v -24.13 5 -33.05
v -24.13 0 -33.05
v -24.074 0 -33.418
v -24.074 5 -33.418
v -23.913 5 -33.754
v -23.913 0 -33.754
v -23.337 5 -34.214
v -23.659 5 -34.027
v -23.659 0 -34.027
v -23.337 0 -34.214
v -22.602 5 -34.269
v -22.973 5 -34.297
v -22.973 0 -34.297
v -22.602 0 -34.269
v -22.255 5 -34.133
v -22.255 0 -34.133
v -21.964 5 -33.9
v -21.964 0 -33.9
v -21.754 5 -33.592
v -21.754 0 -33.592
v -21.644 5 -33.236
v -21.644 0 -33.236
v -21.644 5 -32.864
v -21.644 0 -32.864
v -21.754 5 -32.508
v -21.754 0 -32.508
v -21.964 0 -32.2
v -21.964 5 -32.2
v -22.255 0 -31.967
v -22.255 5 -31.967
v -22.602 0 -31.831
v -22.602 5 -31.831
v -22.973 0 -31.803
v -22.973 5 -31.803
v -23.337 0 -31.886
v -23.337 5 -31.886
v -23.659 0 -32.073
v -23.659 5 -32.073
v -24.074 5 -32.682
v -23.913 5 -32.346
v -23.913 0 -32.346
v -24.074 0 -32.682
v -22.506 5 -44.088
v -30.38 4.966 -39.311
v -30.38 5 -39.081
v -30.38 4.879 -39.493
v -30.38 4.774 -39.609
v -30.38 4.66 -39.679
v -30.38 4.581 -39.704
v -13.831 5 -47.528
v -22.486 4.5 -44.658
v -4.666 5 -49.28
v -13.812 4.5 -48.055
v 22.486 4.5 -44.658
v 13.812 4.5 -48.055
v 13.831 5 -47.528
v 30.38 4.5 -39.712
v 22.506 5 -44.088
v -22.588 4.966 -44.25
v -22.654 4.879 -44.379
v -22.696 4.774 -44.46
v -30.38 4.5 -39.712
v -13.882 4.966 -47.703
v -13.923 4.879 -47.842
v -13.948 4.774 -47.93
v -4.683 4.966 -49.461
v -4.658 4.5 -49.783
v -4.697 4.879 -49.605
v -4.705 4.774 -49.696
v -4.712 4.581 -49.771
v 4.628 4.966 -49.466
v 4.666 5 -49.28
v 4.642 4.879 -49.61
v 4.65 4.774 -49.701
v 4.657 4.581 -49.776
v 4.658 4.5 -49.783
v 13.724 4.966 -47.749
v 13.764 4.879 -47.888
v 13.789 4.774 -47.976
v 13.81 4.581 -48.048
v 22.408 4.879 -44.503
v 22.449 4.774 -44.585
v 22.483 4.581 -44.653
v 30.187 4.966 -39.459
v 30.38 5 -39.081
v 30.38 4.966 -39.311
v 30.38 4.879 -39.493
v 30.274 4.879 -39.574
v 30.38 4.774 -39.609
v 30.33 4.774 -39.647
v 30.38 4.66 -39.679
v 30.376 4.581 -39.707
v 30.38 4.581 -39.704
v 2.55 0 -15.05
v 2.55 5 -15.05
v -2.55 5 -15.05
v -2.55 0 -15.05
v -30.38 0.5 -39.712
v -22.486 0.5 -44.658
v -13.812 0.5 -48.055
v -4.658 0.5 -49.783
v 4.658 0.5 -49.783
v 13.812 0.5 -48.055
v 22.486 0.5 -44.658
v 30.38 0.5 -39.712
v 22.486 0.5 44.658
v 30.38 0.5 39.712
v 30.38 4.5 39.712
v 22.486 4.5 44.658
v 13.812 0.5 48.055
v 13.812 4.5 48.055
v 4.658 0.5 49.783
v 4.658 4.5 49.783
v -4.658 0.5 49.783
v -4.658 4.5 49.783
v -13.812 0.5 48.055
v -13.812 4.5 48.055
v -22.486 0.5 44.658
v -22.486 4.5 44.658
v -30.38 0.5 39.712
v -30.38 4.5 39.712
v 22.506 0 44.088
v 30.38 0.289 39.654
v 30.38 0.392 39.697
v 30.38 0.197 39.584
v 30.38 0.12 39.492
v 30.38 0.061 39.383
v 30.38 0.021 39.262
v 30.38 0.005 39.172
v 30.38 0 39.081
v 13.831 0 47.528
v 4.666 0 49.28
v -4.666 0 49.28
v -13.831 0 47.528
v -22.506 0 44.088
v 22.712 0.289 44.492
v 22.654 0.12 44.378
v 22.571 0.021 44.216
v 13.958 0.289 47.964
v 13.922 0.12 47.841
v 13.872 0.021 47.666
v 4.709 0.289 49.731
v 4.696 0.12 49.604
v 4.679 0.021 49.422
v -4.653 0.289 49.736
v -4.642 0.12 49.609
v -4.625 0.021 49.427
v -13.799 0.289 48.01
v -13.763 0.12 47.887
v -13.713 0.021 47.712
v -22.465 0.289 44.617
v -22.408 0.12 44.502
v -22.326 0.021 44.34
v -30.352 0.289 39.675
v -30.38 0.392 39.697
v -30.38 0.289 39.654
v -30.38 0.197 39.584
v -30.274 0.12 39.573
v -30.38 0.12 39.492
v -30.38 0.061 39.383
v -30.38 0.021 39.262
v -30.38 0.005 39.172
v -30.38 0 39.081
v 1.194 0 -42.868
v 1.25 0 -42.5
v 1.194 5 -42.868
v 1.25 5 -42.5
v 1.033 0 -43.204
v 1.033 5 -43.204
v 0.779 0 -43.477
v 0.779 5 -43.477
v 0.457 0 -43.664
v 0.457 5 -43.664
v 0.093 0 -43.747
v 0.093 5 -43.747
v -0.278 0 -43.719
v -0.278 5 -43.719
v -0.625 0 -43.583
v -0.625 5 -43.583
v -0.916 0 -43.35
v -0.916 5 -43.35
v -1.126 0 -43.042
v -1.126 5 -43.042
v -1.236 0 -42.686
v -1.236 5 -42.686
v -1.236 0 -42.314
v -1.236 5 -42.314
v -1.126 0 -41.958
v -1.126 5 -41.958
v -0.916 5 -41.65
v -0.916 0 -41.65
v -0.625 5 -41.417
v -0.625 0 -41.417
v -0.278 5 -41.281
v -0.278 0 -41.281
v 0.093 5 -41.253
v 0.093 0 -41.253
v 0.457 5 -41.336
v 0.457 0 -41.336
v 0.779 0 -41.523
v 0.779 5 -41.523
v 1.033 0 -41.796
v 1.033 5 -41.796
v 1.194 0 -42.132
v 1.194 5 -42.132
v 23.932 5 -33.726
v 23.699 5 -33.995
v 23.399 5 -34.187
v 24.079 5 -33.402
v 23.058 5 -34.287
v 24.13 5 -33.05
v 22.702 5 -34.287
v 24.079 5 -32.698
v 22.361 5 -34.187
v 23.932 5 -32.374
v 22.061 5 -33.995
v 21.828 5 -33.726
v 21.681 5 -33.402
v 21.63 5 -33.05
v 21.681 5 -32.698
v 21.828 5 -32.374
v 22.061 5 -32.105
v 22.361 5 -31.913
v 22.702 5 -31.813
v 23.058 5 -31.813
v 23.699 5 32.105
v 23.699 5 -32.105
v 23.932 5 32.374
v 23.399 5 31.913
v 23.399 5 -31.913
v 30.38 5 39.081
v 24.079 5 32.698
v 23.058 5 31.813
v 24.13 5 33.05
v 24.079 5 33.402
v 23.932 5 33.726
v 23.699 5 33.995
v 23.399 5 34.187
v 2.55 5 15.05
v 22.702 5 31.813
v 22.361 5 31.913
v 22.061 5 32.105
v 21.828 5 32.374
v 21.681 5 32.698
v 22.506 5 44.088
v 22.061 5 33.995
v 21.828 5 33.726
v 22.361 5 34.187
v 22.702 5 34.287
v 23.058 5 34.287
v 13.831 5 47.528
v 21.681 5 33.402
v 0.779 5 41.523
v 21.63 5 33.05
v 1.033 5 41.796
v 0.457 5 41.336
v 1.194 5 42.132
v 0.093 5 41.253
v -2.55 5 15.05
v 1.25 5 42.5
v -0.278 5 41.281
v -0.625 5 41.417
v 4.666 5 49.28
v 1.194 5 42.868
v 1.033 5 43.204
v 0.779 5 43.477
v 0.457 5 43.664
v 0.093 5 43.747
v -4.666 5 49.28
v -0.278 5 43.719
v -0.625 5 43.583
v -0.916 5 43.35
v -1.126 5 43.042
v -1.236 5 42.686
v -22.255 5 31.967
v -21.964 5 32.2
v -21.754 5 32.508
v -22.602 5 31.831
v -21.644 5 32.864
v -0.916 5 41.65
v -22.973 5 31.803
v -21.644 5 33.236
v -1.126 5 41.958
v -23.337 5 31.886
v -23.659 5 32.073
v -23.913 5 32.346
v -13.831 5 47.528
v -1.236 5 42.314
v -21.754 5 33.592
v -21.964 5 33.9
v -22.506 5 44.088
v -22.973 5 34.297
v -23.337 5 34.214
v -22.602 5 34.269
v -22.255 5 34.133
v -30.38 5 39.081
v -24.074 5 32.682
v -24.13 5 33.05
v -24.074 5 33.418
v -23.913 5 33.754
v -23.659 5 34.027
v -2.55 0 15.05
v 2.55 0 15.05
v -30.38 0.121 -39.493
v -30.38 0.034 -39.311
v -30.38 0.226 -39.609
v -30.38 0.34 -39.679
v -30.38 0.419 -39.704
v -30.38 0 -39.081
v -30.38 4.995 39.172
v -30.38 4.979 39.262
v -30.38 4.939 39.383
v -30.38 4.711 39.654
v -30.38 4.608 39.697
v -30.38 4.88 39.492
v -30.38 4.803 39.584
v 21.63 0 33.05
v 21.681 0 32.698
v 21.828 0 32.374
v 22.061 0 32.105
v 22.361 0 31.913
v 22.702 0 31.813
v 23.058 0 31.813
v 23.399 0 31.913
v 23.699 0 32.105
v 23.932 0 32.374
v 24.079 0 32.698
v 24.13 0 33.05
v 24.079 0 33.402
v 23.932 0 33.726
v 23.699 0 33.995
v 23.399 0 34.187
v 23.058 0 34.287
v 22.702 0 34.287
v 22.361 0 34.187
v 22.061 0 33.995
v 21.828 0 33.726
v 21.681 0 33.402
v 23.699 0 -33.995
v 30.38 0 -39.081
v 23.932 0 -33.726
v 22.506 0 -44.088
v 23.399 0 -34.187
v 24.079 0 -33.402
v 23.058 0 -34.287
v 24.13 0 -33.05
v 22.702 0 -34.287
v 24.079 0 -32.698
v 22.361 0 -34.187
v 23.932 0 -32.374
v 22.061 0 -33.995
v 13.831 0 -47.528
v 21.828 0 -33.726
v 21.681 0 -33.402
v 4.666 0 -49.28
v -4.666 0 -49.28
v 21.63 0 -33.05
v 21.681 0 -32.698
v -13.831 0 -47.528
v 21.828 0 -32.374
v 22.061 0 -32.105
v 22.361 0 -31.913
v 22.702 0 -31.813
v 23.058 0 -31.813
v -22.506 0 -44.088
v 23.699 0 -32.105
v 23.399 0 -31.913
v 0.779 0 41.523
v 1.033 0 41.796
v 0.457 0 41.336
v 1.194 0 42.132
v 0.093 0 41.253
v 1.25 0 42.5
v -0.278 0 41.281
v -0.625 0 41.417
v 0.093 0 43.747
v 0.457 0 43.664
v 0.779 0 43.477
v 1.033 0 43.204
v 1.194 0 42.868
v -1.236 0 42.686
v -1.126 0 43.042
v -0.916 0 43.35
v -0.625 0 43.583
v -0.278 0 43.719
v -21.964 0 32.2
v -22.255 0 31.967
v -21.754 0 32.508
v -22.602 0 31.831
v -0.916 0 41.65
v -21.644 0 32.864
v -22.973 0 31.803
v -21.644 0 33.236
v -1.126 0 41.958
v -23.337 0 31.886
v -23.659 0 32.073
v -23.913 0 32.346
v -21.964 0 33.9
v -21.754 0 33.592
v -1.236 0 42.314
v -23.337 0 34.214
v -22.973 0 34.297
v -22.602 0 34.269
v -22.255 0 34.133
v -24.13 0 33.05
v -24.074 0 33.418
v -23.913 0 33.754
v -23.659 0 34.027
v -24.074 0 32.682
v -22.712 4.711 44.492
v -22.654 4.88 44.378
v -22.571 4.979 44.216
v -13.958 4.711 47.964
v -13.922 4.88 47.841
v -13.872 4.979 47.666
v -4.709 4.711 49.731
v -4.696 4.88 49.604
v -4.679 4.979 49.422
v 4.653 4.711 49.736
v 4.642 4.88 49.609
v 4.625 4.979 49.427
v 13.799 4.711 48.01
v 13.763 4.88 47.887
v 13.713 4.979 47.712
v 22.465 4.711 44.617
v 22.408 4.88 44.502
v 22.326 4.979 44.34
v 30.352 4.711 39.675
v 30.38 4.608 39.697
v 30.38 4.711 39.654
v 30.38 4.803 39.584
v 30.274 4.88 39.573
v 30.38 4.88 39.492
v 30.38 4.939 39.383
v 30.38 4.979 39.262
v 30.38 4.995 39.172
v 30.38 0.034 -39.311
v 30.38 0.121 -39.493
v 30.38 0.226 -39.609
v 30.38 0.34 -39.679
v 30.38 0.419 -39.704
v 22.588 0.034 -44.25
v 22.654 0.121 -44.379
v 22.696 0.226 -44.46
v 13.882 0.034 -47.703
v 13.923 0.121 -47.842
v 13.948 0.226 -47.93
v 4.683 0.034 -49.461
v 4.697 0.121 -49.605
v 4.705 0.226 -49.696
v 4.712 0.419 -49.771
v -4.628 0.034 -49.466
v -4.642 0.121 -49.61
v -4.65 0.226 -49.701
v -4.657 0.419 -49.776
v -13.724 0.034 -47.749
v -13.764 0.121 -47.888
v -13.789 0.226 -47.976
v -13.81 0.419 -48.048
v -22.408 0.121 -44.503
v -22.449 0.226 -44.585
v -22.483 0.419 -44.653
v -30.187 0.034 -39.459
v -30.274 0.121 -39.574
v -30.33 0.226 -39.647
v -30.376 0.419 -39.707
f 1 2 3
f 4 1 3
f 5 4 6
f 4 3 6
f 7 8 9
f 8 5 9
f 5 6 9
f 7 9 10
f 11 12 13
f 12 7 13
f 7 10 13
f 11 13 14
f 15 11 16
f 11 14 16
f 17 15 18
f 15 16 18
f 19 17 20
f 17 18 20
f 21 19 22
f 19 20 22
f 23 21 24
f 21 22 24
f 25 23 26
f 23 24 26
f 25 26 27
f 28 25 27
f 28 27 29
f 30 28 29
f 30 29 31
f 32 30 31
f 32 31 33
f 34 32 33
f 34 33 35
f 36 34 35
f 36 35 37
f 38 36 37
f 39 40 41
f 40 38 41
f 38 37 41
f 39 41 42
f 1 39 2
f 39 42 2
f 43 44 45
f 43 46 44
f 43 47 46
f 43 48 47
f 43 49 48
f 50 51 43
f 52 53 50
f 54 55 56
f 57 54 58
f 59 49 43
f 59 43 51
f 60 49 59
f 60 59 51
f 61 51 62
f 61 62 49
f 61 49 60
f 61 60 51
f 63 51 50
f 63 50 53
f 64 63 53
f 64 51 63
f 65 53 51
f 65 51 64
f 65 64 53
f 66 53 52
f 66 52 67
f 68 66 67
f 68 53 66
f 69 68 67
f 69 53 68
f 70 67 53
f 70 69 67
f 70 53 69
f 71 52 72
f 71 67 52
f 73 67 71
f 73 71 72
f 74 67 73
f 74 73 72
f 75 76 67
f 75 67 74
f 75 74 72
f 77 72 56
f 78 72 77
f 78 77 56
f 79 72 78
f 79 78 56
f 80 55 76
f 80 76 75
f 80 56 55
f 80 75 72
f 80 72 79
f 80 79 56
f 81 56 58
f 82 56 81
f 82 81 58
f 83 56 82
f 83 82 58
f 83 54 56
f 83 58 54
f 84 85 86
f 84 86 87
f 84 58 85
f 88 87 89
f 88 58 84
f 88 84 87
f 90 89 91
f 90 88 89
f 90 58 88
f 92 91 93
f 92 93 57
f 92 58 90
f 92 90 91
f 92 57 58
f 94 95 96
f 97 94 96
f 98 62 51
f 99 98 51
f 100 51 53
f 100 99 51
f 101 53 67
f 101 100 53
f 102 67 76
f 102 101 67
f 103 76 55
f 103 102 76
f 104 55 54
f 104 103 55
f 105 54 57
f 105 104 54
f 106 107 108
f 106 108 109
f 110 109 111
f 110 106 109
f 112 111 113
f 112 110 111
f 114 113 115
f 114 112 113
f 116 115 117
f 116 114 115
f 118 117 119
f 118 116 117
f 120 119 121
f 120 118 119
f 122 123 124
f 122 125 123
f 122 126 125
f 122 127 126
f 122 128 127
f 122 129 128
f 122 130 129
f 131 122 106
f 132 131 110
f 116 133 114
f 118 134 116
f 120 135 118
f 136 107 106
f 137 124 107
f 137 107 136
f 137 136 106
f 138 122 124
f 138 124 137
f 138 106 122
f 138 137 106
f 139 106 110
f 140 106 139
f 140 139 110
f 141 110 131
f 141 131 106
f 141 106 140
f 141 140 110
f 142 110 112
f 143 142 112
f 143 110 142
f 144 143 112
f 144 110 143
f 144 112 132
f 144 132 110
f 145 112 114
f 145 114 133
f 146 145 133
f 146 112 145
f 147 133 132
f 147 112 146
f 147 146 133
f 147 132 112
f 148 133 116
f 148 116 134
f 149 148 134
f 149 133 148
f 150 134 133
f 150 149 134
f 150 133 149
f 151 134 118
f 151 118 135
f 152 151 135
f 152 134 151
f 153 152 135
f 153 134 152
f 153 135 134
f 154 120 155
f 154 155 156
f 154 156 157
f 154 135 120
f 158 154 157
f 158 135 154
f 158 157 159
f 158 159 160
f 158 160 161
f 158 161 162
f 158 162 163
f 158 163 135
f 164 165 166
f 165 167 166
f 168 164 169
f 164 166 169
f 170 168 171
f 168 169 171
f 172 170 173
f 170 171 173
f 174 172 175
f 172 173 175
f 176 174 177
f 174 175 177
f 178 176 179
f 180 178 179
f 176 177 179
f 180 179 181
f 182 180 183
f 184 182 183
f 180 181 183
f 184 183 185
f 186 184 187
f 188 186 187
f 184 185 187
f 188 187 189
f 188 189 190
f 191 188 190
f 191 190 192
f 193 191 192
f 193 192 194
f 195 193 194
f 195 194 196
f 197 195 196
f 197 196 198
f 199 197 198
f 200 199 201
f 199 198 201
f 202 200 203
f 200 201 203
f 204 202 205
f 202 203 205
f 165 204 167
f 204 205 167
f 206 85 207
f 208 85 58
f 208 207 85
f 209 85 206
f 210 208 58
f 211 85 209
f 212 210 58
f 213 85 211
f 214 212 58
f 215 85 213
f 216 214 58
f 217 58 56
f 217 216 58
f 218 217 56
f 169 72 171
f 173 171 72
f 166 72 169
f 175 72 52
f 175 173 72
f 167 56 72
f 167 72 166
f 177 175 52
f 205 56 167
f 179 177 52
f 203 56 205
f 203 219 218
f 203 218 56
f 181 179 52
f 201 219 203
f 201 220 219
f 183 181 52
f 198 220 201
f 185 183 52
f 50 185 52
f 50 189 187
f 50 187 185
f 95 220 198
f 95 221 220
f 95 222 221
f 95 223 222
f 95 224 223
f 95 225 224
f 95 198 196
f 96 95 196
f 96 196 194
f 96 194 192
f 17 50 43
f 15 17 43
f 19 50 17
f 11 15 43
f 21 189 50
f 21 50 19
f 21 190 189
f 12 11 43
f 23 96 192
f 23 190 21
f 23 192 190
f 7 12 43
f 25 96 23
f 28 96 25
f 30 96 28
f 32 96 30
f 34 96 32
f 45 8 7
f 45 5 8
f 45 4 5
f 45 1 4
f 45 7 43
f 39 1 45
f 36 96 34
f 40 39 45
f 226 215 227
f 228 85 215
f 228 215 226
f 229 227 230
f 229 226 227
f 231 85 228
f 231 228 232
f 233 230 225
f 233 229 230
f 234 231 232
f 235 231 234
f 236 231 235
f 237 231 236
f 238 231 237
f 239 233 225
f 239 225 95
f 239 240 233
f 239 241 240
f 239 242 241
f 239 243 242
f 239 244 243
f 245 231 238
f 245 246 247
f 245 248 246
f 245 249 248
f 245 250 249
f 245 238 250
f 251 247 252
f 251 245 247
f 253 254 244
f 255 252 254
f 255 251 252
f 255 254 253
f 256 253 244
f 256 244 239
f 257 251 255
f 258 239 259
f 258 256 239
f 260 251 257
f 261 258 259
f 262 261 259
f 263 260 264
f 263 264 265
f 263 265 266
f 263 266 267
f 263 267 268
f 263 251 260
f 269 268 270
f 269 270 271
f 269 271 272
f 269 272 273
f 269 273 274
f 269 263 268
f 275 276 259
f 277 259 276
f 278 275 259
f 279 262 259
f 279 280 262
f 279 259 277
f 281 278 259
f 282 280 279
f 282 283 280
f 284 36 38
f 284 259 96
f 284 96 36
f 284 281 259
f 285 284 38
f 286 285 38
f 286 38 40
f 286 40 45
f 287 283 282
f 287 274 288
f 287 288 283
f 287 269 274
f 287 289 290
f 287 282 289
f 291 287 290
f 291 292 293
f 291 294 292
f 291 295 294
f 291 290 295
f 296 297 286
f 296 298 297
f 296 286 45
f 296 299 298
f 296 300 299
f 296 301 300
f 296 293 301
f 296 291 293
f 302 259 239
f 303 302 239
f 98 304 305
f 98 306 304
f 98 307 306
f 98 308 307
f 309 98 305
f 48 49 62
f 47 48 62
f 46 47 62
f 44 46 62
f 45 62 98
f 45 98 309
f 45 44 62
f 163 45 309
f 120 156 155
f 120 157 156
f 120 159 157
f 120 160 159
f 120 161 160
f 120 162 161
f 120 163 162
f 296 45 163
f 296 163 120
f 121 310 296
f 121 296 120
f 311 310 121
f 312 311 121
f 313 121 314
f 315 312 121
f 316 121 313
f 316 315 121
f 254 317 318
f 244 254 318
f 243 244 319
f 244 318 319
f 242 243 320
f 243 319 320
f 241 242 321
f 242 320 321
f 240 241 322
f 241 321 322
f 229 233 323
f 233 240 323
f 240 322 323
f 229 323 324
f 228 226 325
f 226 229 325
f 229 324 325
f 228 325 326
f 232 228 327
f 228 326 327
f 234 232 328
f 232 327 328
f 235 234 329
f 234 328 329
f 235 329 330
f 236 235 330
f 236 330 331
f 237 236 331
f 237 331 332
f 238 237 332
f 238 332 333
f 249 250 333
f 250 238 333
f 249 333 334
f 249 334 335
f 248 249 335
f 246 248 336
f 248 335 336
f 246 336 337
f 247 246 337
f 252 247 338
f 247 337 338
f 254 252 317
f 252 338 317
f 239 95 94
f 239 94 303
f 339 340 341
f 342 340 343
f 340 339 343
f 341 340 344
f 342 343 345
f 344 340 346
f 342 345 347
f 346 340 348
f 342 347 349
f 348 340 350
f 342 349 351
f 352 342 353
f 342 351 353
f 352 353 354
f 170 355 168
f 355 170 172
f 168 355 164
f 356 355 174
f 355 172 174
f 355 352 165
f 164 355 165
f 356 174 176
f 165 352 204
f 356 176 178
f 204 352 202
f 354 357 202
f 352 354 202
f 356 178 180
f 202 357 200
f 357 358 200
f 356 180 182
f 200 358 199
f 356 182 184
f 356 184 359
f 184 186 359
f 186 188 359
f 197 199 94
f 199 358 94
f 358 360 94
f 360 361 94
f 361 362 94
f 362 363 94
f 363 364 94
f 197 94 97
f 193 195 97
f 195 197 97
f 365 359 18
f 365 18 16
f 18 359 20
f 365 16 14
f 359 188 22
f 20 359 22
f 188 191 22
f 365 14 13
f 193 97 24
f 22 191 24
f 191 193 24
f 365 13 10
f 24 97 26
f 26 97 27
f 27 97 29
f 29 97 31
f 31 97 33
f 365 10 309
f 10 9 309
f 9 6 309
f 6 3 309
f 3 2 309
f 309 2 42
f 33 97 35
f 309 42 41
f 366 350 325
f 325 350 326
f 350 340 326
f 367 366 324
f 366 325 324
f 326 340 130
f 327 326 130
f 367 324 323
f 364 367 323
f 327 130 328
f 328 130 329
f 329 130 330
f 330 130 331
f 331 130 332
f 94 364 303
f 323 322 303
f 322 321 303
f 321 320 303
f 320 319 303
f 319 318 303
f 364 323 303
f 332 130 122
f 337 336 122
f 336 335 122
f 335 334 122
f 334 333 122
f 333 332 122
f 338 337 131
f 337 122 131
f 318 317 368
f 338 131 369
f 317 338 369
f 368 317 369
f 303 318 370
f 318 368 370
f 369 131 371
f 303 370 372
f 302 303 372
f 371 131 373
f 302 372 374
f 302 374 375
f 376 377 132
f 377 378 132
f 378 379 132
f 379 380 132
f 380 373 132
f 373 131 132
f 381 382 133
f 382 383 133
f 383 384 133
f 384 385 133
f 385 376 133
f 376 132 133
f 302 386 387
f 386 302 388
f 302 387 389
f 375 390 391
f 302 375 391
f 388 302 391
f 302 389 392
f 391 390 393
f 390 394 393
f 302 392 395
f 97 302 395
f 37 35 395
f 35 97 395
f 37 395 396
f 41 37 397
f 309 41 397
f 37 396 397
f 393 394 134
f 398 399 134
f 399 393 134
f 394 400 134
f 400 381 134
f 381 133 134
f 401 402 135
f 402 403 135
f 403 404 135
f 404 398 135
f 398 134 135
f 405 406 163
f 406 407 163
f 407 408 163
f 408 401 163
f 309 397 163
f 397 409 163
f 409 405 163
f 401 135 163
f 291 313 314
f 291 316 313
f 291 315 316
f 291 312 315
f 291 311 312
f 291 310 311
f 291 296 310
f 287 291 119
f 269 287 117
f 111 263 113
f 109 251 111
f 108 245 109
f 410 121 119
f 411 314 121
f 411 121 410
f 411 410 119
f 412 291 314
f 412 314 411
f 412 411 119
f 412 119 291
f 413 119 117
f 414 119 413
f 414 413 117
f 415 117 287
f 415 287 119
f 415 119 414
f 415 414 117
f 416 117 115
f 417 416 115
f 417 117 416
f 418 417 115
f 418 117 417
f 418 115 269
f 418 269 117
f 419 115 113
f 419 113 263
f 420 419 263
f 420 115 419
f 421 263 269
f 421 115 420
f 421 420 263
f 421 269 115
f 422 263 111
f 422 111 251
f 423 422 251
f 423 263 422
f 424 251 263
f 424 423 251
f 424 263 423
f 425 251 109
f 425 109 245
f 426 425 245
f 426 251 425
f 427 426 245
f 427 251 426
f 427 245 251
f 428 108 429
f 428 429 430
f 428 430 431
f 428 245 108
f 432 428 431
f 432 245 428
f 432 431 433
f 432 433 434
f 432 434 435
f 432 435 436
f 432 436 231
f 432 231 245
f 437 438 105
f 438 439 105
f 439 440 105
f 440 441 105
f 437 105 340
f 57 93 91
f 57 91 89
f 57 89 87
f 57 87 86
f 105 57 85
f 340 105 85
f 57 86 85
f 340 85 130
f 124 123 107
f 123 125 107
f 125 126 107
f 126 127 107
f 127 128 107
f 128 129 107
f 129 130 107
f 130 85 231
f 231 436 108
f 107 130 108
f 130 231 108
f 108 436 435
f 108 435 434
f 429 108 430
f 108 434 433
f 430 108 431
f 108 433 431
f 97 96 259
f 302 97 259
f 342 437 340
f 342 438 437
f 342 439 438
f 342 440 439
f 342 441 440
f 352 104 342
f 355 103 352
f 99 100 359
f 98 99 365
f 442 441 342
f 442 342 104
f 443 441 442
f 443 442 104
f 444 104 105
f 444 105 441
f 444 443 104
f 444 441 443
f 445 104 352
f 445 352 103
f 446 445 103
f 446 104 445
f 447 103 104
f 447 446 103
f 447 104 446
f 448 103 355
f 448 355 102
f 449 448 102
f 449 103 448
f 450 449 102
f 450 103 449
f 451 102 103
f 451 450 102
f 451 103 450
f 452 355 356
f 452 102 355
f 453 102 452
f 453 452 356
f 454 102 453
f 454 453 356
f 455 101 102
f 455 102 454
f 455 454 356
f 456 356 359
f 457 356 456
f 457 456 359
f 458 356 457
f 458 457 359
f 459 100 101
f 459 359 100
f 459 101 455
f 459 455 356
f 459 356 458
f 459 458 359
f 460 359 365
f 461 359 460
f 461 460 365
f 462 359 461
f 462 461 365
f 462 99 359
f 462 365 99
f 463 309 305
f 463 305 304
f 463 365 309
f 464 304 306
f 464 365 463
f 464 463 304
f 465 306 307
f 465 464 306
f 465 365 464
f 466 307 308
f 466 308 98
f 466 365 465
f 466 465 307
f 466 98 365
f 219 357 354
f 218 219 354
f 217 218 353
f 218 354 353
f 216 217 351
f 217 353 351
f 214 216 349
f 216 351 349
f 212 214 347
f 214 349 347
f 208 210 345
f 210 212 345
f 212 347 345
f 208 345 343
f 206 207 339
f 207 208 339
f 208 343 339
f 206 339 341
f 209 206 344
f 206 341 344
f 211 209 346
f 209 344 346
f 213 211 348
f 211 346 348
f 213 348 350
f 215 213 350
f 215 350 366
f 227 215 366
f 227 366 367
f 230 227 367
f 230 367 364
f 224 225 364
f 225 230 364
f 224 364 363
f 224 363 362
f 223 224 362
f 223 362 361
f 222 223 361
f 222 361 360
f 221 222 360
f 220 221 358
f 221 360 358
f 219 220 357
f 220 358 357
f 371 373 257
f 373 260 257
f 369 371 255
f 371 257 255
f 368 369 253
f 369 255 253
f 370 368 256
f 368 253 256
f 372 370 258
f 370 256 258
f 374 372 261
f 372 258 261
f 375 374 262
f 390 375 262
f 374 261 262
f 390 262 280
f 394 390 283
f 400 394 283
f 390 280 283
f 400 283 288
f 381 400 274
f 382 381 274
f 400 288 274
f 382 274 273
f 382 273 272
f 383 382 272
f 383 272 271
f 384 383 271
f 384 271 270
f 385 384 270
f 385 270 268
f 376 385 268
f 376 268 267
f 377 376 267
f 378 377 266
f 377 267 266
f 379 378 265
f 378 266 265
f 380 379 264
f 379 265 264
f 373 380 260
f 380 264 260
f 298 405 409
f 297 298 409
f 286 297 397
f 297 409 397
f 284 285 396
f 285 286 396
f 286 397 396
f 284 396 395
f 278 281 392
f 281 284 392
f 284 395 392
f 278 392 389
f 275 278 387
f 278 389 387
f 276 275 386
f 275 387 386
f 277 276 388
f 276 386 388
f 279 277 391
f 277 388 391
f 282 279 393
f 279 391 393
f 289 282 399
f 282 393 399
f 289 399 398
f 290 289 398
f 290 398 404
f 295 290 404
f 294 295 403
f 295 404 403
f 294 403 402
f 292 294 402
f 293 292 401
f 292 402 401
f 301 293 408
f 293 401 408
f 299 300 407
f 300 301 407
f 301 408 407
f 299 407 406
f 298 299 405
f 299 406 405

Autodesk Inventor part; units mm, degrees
ref_plane "YZ Plane" through (0, 0, 0) normal (1, 0, 0) x (0, 1, 0)
ref_plane "XZ Plane" through (0, 0, 0) normal (0, 1, 0) x (-1, 0, 0)
ref_plane "XY Plane" through (0, 0, 0) normal (0, 0, 1) x (1, 0, 0)
sketch "Sketch1" plane through (0, 0, 0) normal (0, 1, 0) x (-1, 0, 0)
  circle A0 centre (0, 0) radius 50
  line L0 (-25.38, 0) -> (-25.38, 35.55)
  line L1 (-25.38, 35.55) -> (0, 35.55)
  line L2 (25.38, 35.55) -> (0, 35.55)
  line L3 (25.38, 35.55) -> (25.38, 0)
  line L4 (-25.38, 0) -> (-25.38, -35.55)
  line L5 (-25.38, -35.55) -> (0, -35.55)
  line L6 (25.38, -35.55) -> (0, -35.55)
  line L7 (25.38, -35.55) -> (25.38, 0)
  line L8 (-25.38, -35.55) -> (-25.38, -33.05)
  line L9 (-25.38, -33.05) -> (-22.88, -33.05)
  circle A1 centre (-22.88, -33.05) radius 1.25
  line L10 (-25.38, 35.55) -> (-25.38, 33.05)
  line L11 (-25.38, 33.05) -> (-22.88, 33.05)
  circle A2 centre (-22.88, 33.05) radius 1.25
  line L12 (25.38, 35.55) -> (25.38, 33.05)
  line L13 (25.38, 33.05) -> (22.88, 33.05)
  circle A3 centre (22.88, 33.05) radius 1.25
  line L14 (25.38, -35.55) -> (25.38, -33.05)
  line L15 (25.38, -33.05) -> (22.88, -33.05)
  circle A4 centre (22.88, -33.05) radius 1.25
  dimension "d0" = 100
  dimension "d4" = 50.76
  dimension "d5" = 2.5
  dimension "d6" = 2.5
  dimension "d7" = 2.5
  dimension "d8" = 2.5
  dimension "d9" = 2.5
  dimension "d10" = 2.5
  dimension "d11" = 2.5
  dimension "d12" = 2.5
  dimension "d13" = 2.5
  dimension "d14" = 2.5
  dimension "d15" = 2.5
  dimension "d16" = 2.5
extrude "Extrusion1" add sketch "Sketch1" along normal blind 5 contours A0 | L0 L1 L2 L3 L7 L6 L5 L4
sketch "Sketch2" plane through (0, 5, 0) normal (0, 1, 0) x (1, 0, 0)
  line L0 (0, 0) -> (-2.55, 0)
  line L1 (-2.55, 0) -> (2.55, 0)
  line L2 (2.55, 0) -> (2.55, -15.05)
  line L3 (2.55, -15.05) -> (2.55, 15.05)
  line L4 (2.55, 15.05) -> (-2.55, 15.05)
  line L5 (-2.55, 15.05) -> (-2.55, -15.05)
  line L6 (-2.55, -15.05) -> (2.55, -15.05)
  dimension "d19" = 2.55
  dimension "d20" = 5.1
  dimension "d21" = 15.05
  dimension "d22" = 30.1
extrude "Extrusion2" cut sketch "Sketch2" against normal blind 5
sketch "Sketch3" plane through (0, 5, 0) normal (0, 1, 0) x (1, 0, 0)
  circle A0 centre (-22.88, -33.05) radius 1.25 projected
  line L0 (-22.88, -33.05) -> (-30.38, -33.05)
  line L1 (-30.38, -33.05) -> (-30.38, -39.7122)
  circle A1 centre (0, 0) radius 50 projected
  line L2 (-30.38, -33.05) -> (-30.38, 39.7122)
  circle A2 centre (22.88, 33.05) radius 1.25 projected
  line L3 (22.88, 33.05) -> (30.38, 33.05)
  line L4 (30.38, 33.05) -> (30.38, 39.7122)
  line L5 (30.38, 39.7122) -> (30.38, -39.7122)
  dimension "d25" = 7.5
  dimension "d26" = 7.5
extrude "Extrusion3" cut sketch "Sketch3" against normal blind 5 contours L1 A1 L2 | L5 L4 A1
sketch "Sketch4" plane through (0, 5, 0) normal (0, 1, 0) x (1, 0, 0)
  arc A0 (-30.38, -39.7122) -> (30.38, -39.7122) centre (0, 0) ccw projected
  line L0 (0, -50) -> (0, -42.5)
  circle A1 centre (0, -42.5) radius 1.25
  arc A2 (30.38, 39.7122) -> (-30.38, 39.7122) centre (0, 0) ccw projected
  line L1 (0, 50) -> (0, 42.5)
  circle A3 centre (0, 42.5) radius 1.25
  dimension "d29" = 7.5
  dimension "d30" = 2.5
  dimension "d31" = 7.5
  dimension "d32" = 2.5
extrude "Extrusion4" cut sketch "Sketch4" against normal blind 5
fillet "Fillet1" radius 0.5 4 edges at (0, 5, 50) (0, 5, -50) (0, 0, 50) (0, 0, -50)
properties part number "Chasis_Cap"
